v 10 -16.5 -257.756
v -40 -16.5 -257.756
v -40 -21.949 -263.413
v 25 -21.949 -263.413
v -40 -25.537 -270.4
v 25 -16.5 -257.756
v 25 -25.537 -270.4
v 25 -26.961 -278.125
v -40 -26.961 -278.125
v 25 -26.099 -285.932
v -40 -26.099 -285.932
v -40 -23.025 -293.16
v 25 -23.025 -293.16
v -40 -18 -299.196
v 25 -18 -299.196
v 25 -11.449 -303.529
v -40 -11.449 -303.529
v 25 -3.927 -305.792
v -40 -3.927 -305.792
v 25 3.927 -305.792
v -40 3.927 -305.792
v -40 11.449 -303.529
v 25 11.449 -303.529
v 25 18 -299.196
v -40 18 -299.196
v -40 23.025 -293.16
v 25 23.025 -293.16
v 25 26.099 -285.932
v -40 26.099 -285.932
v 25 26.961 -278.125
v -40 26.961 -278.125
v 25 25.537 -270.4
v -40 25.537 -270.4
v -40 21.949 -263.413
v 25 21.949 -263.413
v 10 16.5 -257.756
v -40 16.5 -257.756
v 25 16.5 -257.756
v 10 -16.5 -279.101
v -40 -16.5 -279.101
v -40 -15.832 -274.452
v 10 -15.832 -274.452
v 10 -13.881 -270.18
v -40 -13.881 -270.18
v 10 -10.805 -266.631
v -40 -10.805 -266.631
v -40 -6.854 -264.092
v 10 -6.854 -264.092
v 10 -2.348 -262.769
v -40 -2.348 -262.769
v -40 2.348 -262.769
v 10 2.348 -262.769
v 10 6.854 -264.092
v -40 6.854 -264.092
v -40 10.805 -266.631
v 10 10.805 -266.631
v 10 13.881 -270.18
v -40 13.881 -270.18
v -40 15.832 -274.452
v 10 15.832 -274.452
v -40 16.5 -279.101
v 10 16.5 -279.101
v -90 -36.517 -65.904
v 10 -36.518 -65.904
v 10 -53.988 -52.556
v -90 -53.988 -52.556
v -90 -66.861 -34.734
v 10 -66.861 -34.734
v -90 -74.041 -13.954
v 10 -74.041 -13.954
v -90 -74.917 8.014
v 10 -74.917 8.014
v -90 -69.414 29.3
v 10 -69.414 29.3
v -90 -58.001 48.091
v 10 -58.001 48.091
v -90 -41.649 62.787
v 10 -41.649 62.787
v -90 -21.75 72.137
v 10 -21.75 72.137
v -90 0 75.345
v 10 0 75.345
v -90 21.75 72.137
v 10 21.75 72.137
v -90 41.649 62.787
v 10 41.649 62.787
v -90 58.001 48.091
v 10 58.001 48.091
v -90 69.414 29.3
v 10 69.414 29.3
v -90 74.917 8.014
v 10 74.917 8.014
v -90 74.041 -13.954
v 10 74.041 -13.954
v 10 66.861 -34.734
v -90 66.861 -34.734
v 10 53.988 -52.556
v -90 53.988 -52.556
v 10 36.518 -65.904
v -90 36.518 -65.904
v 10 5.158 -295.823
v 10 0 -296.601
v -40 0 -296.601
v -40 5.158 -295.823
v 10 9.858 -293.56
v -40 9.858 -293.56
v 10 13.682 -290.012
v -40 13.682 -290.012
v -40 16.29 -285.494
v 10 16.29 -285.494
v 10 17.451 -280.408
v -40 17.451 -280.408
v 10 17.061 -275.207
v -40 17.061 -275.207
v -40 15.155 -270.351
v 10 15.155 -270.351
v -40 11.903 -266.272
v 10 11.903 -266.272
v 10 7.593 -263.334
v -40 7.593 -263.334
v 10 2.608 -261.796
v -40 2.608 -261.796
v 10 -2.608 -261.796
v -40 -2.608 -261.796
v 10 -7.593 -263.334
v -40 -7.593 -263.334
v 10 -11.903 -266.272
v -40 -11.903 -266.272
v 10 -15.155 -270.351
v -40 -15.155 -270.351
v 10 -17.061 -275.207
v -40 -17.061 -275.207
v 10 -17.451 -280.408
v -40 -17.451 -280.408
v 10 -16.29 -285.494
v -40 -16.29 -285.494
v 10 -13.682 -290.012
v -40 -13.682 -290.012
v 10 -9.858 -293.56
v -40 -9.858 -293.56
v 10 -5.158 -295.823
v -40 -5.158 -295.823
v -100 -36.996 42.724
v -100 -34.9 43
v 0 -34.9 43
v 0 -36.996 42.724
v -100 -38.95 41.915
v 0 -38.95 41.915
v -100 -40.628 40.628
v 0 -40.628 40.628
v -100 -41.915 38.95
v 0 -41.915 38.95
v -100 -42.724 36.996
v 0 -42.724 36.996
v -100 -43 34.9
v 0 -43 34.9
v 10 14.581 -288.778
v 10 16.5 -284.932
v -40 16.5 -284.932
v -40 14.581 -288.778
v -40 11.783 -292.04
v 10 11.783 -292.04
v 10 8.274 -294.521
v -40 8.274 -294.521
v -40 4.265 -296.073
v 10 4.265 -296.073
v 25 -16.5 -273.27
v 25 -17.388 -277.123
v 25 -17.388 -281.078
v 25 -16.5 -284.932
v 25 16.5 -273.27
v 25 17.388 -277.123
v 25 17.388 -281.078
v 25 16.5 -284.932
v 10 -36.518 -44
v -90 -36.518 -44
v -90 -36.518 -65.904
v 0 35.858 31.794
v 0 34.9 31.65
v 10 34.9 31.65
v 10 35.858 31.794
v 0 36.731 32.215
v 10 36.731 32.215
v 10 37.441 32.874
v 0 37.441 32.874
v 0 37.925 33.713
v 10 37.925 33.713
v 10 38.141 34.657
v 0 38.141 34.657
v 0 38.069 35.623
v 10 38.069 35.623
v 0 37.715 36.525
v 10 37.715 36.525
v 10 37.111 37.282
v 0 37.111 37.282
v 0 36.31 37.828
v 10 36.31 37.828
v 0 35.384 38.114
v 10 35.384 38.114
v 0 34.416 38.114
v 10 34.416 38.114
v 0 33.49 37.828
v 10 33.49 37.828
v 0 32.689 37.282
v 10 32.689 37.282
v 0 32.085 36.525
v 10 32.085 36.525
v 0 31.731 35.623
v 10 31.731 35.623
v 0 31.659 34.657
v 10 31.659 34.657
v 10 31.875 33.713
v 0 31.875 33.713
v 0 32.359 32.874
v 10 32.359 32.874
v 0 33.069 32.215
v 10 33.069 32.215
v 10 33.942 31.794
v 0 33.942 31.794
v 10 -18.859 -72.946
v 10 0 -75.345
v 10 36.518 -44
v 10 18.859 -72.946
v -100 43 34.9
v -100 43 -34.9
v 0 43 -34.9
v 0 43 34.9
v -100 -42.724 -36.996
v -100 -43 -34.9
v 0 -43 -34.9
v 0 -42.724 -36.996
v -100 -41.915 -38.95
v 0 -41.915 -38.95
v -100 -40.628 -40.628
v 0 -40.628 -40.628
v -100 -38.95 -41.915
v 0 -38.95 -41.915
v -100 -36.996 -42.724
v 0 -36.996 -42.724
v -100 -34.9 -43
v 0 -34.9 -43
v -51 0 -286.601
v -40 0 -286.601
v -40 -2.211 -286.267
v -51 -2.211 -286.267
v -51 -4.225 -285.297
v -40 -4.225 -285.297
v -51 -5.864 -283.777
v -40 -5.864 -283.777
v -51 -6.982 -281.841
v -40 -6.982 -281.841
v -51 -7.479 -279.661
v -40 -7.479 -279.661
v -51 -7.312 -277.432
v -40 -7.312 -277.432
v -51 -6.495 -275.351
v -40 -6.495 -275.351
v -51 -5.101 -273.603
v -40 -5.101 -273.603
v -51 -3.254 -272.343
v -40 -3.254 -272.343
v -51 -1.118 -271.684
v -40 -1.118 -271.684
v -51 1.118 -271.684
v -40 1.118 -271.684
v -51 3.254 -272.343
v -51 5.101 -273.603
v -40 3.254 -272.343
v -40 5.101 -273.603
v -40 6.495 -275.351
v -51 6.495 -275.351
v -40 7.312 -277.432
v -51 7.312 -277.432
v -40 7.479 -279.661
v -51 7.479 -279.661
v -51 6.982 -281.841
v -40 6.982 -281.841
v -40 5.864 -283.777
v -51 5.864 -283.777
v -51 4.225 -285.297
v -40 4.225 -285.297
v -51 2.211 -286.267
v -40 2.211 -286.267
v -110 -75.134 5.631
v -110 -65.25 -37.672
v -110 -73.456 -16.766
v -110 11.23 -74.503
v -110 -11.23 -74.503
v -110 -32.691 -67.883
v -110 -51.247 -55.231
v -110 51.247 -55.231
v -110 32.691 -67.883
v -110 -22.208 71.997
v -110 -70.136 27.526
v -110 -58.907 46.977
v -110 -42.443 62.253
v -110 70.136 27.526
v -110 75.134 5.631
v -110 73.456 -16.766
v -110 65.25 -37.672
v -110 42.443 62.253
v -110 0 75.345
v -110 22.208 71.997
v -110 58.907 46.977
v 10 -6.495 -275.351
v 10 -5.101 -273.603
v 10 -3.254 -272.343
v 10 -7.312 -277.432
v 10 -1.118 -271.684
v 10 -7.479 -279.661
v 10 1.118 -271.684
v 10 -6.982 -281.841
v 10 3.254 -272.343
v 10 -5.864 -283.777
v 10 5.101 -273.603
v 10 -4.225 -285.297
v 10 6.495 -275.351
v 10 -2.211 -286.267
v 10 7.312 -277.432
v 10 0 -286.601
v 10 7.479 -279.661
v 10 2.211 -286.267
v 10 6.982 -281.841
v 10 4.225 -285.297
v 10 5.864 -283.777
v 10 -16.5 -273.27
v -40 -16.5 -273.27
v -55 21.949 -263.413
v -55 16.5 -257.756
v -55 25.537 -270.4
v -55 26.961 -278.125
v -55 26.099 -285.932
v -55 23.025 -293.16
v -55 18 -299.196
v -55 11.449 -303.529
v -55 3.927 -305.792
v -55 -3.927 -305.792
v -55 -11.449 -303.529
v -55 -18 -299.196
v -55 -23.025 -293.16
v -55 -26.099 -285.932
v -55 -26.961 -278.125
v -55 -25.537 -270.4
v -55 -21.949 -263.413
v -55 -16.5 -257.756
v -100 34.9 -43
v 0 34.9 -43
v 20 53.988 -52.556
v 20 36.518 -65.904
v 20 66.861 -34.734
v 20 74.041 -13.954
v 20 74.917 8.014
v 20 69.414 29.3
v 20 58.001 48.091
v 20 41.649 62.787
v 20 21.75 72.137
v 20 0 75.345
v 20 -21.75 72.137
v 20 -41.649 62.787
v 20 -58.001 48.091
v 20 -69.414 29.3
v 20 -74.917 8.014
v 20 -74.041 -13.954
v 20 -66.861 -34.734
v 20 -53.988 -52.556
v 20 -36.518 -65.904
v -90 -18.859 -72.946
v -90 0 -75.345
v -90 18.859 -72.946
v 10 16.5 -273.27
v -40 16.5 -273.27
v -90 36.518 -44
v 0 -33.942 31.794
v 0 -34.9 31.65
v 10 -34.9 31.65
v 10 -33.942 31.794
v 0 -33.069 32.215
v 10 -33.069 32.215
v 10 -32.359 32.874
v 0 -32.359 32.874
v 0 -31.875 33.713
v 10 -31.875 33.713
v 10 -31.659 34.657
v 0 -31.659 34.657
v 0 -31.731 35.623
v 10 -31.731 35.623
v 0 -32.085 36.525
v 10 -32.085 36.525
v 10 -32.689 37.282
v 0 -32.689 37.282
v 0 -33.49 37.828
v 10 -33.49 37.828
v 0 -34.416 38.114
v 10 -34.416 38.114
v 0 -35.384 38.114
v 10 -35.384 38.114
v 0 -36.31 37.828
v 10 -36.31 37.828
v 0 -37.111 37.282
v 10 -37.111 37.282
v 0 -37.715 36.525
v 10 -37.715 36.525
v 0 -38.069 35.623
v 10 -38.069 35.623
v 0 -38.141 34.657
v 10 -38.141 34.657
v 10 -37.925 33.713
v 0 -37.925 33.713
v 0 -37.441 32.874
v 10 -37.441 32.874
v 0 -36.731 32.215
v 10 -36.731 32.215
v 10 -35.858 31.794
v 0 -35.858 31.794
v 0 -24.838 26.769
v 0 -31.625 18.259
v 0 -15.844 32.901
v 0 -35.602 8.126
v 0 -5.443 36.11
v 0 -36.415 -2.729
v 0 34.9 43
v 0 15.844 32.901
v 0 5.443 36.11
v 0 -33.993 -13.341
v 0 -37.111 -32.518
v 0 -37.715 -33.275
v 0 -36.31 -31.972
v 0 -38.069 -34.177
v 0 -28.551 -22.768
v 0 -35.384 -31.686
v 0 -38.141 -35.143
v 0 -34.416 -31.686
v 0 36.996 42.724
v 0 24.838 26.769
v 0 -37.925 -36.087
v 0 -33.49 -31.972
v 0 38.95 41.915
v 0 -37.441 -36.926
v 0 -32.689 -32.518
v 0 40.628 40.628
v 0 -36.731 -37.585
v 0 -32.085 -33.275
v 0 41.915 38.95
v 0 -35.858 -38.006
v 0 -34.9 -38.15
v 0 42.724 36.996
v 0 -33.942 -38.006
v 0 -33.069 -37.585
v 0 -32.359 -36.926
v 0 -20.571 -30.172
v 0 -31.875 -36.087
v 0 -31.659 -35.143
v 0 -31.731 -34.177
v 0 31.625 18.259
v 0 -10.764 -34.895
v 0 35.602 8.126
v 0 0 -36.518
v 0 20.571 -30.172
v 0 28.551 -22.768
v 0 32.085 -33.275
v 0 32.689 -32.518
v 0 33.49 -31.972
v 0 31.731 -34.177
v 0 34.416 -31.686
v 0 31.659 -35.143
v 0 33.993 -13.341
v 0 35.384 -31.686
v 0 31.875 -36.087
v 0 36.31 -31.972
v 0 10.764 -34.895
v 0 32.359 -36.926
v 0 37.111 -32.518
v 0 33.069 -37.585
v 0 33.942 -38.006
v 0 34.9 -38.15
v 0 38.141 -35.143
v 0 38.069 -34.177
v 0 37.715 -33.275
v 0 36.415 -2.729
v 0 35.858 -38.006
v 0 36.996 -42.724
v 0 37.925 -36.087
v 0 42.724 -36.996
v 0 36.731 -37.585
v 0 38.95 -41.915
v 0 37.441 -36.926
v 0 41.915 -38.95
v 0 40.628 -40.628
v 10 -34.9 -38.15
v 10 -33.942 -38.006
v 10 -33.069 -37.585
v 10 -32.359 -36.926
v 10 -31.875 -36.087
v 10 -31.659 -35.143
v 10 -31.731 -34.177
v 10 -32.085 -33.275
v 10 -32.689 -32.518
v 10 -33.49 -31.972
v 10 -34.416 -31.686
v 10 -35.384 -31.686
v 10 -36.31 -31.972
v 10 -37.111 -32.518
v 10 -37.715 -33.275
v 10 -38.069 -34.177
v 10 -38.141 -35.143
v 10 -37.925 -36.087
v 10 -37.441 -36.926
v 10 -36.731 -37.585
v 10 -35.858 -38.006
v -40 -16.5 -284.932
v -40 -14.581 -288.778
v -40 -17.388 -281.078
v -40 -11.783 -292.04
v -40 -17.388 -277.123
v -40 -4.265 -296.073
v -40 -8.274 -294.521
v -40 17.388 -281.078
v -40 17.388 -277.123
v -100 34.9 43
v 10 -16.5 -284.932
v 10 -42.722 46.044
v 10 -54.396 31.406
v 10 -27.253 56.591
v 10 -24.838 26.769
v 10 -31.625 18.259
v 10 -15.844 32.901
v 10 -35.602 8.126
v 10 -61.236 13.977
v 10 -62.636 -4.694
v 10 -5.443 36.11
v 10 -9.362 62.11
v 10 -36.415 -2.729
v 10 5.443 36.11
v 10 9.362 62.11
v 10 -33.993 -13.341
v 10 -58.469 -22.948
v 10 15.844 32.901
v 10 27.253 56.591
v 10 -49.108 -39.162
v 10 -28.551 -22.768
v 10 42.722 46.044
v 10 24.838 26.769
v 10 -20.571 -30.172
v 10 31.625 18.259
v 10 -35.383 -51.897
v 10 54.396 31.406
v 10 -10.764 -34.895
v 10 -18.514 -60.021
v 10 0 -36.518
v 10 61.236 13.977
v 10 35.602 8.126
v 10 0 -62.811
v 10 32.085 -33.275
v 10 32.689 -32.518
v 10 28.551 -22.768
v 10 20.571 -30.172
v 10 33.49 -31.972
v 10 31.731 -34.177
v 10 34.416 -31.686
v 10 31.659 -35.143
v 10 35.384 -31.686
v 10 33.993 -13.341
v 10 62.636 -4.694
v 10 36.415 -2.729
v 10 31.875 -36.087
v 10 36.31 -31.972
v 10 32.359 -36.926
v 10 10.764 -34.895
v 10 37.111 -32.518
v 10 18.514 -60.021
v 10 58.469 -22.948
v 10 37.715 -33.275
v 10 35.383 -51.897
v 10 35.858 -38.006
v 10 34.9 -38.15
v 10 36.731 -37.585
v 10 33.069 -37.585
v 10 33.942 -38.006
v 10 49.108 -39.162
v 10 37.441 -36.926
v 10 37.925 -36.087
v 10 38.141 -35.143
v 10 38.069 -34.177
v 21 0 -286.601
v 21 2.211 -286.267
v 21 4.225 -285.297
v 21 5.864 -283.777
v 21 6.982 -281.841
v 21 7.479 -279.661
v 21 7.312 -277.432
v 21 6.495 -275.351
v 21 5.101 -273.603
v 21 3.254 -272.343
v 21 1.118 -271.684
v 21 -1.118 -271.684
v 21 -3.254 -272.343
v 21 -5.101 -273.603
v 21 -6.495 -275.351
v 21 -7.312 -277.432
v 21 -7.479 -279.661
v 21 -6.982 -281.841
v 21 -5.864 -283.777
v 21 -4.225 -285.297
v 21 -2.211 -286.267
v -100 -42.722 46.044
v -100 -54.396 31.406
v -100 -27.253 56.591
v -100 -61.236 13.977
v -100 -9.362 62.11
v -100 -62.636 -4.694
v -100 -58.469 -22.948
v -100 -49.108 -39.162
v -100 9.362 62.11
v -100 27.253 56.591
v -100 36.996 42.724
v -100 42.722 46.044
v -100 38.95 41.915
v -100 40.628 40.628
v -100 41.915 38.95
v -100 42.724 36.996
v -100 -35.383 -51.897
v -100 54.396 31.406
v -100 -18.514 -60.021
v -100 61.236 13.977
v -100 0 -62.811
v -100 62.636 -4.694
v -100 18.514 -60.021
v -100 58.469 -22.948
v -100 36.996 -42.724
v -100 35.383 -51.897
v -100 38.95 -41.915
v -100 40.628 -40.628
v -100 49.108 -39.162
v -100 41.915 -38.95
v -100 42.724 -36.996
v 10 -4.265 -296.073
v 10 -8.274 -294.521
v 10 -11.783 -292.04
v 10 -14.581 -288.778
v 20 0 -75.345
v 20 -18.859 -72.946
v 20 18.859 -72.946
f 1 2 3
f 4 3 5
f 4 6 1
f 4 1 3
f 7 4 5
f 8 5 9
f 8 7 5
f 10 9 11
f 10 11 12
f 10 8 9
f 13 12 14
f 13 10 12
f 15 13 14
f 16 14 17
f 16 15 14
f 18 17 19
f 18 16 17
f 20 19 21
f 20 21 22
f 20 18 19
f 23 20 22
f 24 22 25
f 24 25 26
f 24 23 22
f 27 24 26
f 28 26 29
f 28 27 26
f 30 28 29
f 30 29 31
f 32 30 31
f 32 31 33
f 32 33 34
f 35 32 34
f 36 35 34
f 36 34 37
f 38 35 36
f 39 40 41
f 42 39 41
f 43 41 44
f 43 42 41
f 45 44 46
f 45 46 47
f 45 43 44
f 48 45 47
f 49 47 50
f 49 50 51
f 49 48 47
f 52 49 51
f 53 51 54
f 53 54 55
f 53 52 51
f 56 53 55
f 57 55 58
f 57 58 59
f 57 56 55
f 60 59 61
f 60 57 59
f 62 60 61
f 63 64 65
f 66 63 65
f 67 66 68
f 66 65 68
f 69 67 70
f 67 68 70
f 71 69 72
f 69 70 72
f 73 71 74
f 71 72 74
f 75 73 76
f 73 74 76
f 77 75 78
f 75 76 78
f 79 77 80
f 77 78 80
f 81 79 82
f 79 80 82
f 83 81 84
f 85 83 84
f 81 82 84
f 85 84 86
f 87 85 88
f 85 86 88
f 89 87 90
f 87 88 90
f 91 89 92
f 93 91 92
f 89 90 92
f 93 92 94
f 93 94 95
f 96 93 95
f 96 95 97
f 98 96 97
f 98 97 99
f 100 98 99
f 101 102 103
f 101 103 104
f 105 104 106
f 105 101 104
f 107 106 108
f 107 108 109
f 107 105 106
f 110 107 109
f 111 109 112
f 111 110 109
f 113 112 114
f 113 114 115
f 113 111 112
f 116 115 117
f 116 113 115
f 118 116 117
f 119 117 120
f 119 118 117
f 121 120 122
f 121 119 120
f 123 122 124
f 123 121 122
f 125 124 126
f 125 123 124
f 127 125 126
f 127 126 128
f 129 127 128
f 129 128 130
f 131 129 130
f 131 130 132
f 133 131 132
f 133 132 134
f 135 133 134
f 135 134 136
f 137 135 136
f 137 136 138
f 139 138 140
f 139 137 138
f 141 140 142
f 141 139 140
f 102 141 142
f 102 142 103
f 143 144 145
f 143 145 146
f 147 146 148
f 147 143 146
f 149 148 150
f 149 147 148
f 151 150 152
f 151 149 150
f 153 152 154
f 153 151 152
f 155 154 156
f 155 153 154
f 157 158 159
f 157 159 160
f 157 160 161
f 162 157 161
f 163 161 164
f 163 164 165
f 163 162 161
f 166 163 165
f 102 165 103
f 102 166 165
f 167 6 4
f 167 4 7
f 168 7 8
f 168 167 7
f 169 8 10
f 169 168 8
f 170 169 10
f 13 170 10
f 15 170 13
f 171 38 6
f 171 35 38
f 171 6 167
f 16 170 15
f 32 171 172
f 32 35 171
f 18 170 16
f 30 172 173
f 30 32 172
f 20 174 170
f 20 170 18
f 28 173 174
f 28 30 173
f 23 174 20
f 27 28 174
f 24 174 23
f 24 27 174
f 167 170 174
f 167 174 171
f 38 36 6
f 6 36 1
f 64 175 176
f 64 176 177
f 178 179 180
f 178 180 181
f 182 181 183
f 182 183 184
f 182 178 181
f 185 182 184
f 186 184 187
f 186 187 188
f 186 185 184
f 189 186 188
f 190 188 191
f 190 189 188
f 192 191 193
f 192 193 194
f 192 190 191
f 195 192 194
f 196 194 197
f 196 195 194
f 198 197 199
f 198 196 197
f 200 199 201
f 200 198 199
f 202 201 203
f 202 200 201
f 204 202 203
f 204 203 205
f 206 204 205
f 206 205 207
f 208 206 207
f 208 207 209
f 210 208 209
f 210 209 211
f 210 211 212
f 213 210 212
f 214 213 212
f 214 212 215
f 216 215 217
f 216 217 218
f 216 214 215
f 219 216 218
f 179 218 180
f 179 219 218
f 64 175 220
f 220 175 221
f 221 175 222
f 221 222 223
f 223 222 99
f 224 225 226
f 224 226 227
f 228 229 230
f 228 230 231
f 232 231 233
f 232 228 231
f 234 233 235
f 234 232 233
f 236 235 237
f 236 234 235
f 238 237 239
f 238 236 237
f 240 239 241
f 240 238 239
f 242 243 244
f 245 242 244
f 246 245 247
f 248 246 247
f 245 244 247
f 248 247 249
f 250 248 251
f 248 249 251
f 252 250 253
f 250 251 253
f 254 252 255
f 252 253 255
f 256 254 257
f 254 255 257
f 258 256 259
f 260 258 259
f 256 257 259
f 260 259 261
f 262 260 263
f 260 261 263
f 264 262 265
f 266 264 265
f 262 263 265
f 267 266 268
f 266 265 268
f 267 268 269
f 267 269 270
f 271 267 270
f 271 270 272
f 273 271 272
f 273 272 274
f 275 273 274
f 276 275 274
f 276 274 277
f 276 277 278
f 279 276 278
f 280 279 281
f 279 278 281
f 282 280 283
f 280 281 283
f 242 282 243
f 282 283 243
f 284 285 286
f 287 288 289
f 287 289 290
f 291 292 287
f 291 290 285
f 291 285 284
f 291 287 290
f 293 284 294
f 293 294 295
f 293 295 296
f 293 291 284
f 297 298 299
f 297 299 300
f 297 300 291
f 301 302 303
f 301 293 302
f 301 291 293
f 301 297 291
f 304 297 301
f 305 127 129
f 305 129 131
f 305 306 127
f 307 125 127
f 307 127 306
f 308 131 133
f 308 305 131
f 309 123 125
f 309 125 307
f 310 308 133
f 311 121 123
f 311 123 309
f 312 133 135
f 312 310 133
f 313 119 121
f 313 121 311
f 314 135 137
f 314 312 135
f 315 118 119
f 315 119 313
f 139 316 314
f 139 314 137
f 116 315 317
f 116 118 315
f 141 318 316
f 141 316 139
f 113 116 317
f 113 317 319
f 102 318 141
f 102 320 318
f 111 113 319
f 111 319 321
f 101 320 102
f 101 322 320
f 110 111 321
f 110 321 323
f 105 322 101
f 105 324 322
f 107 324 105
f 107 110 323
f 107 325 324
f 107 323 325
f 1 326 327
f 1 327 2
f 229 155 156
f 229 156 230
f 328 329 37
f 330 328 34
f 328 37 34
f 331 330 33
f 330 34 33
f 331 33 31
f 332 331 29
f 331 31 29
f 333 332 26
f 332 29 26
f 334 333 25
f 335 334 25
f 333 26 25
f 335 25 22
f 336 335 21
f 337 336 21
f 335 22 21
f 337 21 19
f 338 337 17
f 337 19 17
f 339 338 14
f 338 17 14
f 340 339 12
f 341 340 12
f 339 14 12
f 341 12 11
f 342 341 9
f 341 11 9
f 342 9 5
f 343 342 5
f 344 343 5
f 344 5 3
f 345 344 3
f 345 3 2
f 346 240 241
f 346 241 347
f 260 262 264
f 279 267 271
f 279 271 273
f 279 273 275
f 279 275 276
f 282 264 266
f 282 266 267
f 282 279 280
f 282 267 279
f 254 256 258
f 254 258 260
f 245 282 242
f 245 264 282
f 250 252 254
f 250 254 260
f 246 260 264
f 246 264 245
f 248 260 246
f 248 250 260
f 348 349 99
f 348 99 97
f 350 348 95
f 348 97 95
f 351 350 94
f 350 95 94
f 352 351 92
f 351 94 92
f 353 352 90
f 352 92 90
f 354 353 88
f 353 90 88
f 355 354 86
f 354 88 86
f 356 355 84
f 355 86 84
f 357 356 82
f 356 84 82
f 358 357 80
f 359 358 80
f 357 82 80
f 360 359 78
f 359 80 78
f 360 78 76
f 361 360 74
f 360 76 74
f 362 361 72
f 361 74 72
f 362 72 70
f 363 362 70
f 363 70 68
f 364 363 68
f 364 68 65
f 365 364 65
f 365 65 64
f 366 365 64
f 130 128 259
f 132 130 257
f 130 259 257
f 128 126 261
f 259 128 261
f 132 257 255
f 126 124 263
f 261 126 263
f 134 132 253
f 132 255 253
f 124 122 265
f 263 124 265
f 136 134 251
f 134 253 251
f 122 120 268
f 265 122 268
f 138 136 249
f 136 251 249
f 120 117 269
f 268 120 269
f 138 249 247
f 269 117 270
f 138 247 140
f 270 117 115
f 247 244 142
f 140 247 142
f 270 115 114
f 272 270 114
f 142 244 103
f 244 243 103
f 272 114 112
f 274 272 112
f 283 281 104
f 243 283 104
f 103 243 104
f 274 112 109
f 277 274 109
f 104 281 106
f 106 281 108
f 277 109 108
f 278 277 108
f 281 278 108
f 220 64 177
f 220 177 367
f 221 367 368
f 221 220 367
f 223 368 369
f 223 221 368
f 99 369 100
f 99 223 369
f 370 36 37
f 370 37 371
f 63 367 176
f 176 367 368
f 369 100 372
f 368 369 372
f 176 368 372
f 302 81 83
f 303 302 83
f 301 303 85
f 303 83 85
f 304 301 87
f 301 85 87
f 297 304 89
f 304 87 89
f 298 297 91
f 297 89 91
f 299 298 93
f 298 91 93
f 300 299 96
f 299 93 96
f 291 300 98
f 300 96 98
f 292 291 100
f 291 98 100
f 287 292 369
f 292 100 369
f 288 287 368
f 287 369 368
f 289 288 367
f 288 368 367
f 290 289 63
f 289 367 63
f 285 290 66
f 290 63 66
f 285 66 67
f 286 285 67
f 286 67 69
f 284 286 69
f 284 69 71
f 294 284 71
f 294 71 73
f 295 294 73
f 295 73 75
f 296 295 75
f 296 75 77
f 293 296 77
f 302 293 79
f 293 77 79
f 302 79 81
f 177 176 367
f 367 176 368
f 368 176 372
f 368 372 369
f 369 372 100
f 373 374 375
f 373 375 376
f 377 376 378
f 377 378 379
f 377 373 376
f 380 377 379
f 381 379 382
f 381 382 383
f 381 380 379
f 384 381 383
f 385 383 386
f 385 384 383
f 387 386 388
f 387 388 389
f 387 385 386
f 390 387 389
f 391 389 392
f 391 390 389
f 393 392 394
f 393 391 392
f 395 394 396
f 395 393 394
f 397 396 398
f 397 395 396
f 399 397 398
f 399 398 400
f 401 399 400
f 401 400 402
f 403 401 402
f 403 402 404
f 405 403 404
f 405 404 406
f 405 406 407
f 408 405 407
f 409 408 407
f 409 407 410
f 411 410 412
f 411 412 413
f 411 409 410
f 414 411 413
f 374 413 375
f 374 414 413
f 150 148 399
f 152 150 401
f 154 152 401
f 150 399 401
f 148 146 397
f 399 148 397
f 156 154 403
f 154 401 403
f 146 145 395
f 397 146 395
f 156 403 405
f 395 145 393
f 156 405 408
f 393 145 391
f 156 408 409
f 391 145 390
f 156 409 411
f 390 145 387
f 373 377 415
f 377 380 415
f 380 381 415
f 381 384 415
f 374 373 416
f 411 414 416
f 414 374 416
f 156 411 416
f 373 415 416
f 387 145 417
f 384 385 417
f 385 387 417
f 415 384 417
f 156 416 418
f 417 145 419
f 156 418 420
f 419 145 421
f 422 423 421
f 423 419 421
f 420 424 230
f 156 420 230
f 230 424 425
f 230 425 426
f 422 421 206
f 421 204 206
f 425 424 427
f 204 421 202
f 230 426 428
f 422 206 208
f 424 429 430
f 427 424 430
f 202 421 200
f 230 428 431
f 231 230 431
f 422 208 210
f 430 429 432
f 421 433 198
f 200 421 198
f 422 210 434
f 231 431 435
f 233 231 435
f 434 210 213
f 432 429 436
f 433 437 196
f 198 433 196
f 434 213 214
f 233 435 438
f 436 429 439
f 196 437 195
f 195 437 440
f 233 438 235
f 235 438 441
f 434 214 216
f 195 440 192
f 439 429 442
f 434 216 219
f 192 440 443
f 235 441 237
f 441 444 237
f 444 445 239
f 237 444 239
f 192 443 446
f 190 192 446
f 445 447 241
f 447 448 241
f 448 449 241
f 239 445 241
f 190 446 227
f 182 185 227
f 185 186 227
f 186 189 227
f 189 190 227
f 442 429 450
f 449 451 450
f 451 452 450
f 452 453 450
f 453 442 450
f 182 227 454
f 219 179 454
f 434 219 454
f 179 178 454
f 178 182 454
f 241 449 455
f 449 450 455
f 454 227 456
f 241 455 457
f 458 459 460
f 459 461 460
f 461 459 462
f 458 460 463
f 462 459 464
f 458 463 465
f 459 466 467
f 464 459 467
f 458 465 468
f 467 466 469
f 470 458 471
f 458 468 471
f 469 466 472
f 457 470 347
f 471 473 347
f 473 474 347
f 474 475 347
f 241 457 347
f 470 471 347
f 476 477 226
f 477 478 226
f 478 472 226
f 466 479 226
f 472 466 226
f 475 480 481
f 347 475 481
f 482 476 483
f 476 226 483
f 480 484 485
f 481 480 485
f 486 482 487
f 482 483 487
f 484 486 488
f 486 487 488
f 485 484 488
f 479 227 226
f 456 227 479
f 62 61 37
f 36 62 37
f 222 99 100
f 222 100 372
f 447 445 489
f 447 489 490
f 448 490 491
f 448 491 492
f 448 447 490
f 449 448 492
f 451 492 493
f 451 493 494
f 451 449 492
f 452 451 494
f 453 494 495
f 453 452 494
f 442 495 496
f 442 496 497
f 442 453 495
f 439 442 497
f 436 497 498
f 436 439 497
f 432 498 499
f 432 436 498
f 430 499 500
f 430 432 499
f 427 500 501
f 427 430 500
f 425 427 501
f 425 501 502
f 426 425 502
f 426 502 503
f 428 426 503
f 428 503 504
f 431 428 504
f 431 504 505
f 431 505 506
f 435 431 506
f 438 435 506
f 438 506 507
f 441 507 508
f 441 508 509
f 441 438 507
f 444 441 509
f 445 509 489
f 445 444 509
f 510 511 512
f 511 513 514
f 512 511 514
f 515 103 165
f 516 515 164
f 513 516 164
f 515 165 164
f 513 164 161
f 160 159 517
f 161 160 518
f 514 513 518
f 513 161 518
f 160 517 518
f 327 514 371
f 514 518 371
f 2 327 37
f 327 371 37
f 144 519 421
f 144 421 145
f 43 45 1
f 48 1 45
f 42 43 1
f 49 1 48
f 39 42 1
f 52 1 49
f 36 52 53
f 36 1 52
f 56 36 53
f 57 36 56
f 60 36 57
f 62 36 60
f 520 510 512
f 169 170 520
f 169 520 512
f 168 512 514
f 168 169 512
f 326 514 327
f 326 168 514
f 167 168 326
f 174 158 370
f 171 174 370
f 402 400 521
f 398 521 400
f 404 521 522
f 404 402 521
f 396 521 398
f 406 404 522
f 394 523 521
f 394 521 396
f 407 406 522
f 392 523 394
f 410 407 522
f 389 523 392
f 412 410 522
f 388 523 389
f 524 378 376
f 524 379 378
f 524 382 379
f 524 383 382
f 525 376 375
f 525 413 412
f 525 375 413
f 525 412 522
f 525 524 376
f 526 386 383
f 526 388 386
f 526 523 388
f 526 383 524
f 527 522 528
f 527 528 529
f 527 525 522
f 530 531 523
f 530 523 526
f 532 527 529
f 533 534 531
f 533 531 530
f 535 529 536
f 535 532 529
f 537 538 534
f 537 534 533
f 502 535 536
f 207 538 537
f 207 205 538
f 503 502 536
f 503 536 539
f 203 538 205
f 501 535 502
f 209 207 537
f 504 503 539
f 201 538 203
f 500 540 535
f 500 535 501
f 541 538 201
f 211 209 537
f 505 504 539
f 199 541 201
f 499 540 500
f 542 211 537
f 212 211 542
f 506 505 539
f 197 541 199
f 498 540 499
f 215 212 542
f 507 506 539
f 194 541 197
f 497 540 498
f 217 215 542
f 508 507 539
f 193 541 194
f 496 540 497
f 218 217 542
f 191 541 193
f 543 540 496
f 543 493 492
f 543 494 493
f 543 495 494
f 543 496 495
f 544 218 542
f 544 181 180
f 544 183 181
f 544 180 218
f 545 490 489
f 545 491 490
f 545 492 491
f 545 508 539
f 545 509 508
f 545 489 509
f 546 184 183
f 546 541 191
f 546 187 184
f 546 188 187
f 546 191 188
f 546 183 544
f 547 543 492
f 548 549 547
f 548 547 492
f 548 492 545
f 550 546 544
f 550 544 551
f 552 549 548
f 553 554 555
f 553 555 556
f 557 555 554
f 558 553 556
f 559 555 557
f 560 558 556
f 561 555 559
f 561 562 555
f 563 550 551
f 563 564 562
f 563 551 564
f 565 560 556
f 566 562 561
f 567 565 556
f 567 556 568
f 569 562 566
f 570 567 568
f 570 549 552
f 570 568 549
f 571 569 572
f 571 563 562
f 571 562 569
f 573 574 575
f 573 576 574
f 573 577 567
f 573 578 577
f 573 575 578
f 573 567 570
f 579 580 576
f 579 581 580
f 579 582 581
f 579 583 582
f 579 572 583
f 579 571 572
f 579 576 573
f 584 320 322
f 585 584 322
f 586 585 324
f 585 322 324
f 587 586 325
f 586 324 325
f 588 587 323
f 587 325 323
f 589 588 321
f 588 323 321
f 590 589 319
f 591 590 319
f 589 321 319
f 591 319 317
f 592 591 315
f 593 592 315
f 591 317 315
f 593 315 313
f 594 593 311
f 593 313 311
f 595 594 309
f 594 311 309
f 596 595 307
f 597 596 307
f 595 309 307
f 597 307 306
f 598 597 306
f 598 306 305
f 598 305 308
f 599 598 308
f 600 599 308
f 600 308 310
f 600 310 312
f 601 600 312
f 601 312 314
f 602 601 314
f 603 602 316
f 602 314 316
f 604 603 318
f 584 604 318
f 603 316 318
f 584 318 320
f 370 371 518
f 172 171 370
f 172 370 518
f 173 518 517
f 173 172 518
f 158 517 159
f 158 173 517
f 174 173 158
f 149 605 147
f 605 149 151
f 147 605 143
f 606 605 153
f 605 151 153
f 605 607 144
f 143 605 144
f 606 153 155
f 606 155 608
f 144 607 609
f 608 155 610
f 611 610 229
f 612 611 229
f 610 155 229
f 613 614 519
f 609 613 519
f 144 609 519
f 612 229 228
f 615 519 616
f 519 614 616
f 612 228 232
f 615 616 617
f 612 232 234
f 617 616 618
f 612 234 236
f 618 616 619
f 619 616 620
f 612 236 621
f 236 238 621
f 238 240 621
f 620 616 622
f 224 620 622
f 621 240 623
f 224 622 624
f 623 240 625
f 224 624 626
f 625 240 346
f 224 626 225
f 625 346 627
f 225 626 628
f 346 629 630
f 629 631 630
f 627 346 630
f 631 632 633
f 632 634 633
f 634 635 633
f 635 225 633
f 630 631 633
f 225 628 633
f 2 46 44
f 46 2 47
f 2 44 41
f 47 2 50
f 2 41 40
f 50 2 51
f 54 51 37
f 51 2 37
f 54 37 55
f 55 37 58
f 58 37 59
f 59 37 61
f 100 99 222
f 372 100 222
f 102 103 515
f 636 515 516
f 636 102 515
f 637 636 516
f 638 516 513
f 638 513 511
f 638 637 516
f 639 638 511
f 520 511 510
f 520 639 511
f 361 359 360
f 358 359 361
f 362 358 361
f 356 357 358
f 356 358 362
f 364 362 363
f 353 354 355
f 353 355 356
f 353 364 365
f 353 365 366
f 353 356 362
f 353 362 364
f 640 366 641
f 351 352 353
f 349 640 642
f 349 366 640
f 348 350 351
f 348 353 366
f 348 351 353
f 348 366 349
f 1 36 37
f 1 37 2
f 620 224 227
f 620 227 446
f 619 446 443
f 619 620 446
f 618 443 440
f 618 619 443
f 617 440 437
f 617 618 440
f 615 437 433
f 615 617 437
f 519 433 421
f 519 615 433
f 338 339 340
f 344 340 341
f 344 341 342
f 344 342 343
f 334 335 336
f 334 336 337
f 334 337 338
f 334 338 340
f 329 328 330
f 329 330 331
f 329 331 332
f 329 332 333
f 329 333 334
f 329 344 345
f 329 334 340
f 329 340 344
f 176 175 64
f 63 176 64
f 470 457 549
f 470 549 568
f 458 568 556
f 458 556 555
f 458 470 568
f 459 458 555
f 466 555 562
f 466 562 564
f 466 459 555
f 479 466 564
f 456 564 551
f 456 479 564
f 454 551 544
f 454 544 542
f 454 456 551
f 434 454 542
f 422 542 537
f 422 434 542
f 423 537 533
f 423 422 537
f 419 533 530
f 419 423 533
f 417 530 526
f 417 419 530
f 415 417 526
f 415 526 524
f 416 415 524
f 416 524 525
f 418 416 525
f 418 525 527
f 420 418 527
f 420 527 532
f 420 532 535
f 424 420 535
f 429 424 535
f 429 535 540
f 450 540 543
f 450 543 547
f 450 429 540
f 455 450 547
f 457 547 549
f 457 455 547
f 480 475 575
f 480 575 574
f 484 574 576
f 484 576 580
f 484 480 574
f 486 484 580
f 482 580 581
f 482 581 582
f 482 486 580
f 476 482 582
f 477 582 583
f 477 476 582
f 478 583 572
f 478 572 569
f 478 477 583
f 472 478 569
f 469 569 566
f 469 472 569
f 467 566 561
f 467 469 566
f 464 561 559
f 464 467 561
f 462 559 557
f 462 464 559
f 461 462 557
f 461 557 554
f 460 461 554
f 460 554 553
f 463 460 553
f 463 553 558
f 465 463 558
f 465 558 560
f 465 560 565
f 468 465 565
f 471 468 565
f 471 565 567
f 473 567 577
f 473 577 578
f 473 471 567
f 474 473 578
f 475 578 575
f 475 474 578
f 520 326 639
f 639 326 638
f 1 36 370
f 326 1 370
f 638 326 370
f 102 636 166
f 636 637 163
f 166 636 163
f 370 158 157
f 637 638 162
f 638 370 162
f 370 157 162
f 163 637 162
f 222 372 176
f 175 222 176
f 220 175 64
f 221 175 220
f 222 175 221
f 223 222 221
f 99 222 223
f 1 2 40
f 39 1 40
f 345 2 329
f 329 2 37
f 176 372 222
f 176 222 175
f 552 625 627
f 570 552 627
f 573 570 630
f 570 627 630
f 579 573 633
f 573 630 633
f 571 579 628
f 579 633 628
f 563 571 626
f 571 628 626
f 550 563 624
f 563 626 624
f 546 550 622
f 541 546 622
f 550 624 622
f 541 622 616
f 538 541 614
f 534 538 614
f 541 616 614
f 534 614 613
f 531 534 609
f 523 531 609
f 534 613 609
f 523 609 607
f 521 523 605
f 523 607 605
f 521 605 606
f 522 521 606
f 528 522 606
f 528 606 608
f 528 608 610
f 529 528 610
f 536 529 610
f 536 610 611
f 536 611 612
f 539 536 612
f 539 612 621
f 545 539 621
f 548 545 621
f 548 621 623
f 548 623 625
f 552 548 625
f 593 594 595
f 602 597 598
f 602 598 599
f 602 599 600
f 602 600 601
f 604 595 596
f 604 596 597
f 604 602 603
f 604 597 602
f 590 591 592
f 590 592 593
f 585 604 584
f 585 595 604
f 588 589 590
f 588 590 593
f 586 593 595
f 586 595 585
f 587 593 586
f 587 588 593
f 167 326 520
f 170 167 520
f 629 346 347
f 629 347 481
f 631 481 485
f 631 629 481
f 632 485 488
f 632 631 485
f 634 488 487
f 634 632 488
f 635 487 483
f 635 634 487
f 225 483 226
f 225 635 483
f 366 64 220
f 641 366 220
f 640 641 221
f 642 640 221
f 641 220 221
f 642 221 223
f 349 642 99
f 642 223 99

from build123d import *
from build123d.topology import SkipClean

# Parameters (mm, degrees)
SKETCH1_R            = 62.811183182
SKETCH1_R_2          = 3.25
SKETCH1_R_3          = 36.5175
BOSS_EXTRUDE1_DEPTH  = 10
BOSS_EXTRUDE2_START  = -100
SKETCH1_3_R          = 62.811183182
BOSS_EXTRUDE2_DEPTH  = 100
BOSS_EXTRUDE3_DEPTH  = 100
SKETCH2_4_R          = 3.25
SKETCH2_4_R_2        = 36.5175
BOSS_EXTRUDE4_DEPTH  = 10
BOSS_EXTRUDE5_DEPTH  = 100
SKETCH4_R            = 75.344599786
BOSS_EXTRUDE6_DEPTH  = 20
SKETCH5_R            = 7.5
BOSS_EXTRUDE7_DEPTH  = 11
SKETCH5_3_R          = 17.5
SKETCH5_3_R_2        = 7.5
BOSS_EXTRUDE8_DEPTH  = 50
SKETCH6_R            = 7.5
BOSS_EXTRUDE9_DEPTH  = 11
BOSS_EXTRUDE10_DEPTH = 50
BOSS_EXTRUDE11_DEPTH = 15
BOSS_EXTRUDE12_DEPTH = 50
BOSS_EXTRUDE13_DEPTH = 15


# Read off the part's stored shape, not the designer's step: Boss-Extrude11
with BuildPart() as part:
    # Sketch1 → Boss-Extrude1 (new body)
    # profile 1 of 2: a face of its own
    with BuildSketch(Plane(origin=(0, 0, 0), x_dir=(0, 0, -1), z_dir=(1, 0, 0))):
        Circle(SKETCH1_R)
        with BuildLine():
            ThreePointArc((43, 34.9), (40.627564928, 40.627564928), (34.9, 43))
            Line((34.9, 43), (-34.9, 43))
            ThreePointArc((-34.9, 43), (-40.627564928, 40.627564928), (-43, 34.9))
            Line((-43, 34.9), (-43, -34.9))
            ThreePointArc((-43, -34.9), (-40.627564928, -40.627564928), (-34.9, -43))
            Line((-34.9, -43), (34.9, -43))
            ThreePointArc((34.9, -43), (40.627564928, -40.627564928), (43, -34.9))
            Line((43, -34.9), (43, 34.9))
        make_face(mode=Mode.SUBTRACT)
    # profile 2 of 2: a face of its own
    with BuildSketch(Plane(origin=(0, 0, 0), x_dir=(0, 0, -1), z_dir=(1, 0, 0))):
        with BuildLine():
            Line((43, -34.9), (43, 34.9))
            ThreePointArc((43, 34.9), (40.627564928, 40.627564928), (34.9, 43))
            Line((34.9, 43), (-34.9, 43))
            ThreePointArc((-34.9, 43), (-40.627564928, 40.627564928), (-43, 34.9))
            Line((-43, 34.9), (-43, -34.9))
            ThreePointArc((-43, -34.9), (-40.627564928, -40.627564928), (-34.9, -43))
            Line((-34.9, -43), (34.9, -43))
            ThreePointArc((34.9, -43), (40.627564928, -40.627564928), (43, -34.9))
        make_face()
        with Locations((-34.9, -34.9)):
            Circle(SKETCH1_R_2, mode=Mode.SUBTRACT)
        with Locations((34.9, -34.9)):
            Circle(SKETCH1_R_2, mode=Mode.SUBTRACT)
        with Locations((34.9, 34.9)):
            Circle(SKETCH1_R_2, mode=Mode.SUBTRACT)
        with Locations((-34.9, 34.9)):
            Circle(SKETCH1_R_2, mode=Mode.SUBTRACT)
        Circle(SKETCH1_R_3, mode=Mode.SUBTRACT)
    extrude(amount=BOSS_EXTRUDE1_DEPTH)

    # Sketch1<3> → Boss-Extrude2 (add)
    with BuildSketch(Plane(origin=(0, 0, 0), x_dir=(0, 0, -1), z_dir=(1, 0, 0)).offset(BOSS_EXTRUDE2_START)):
        Circle(SKETCH1_3_R)
        with BuildLine():
            ThreePointArc((43, 34.9), (40.627564928, 40.627564928), (34.9, 43))
            Line((34.9, 43), (-34.9, 43))
            ThreePointArc((-34.9, 43), (-40.627564928, 40.627564928), (-43, 34.9))
            Line((-43, 34.9), (-43, -34.9))
            ThreePointArc((-43, -34.9), (-40.627564928, -40.627564928), (-34.9, -43))
            Line((-34.9, -43), (34.9, -43))
            ThreePointArc((34.9, -43), (40.627564928, -40.627564928), (43, -34.9))
            Line((43, -34.9), (43, 34.9))
        make_face(mode=Mode.SUBTRACT)
    extrude(amount=BOSS_EXTRUDE2_DEPTH)


with BuildPart() as body_2:
    # Sketch2 → Boss-Extrude3 (new body)
    with BuildSketch(Plane(origin=(10, 0, 0), x_dir=(0, 0, -1), z_dir=(1, 0, 0))):
        with BuildLine():
            Line((44, 36.5175), (44, -36.5175))
            Line((44, -36.5175), (65.903572821, -36.5175))
            ThreePointArc((65.903572821, -36.5175), (75.344599786, 0), (65.903572821, 36.5175))
            Line((65.903572821, 36.5175), (44, 36.5175))
        make_face()
    extrude(amount=-BOSS_EXTRUDE3_DEPTH)


with BuildPart() as body_3:
    # Sketch2<4> → Boss-Extrude4 (new body)
    # profile 1 of 9: a face of its own
    with BuildSketch(Plane(origin=(10, 0, 0), x_dir=(0, 0, -1), z_dir=(1, 0, 0))):
        with BuildLine():
            Line((44, -36.5175), (44, 36.5175))
            Line((44, 36.5175), (51.104959901, 36.5175))
            ThreePointArc((51.104959901, 36.5175), (-62.811183182, 0), (51.104959901, -36.5175))
            Line((51.104959901, -36.5175), (44, -36.5175))
        make_face()
        with Locations((-34.9, -34.9)):
            Circle(SKETCH2_4_R, mode=Mode.SUBTRACT)
        with Locations((34.9, -34.9)):
            Circle(SKETCH2_4_R, mode=Mode.SUBTRACT)
        Circle(SKETCH2_4_R_2, mode=Mode.SUBTRACT)
        with Locations((-34.9, 34.9)):
            Circle(SKETCH2_4_R, mode=Mode.SUBTRACT)
        with Locations((34.9, 34.9)):
            Circle(SKETCH2_4_R, mode=Mode.SUBTRACT)
    # profile 2 of 9: a face of its own
    with BuildSketch(Plane(origin=(10, 0, 0), x_dir=(0, 0, -1), z_dir=(1, 0, 0))):
        with Locations((34.9, 34.9)):
            Circle(SKETCH2_4_R)
    # profile 3 of 9: a face of its own
    with BuildSketch(Plane(origin=(10, 0, 0), x_dir=(0, 0, -1), z_dir=(1, 0, 0))):
        with Locations((34.9, -34.9)):
            Circle(SKETCH2_4_R)
    # profile 4 of 9: a face of its own
    with BuildSketch(Plane(origin=(10, 0, 0), x_dir=(0, 0, -1), z_dir=(1, 0, 0))):
        with Locations((-34.9, -34.9)):
            Circle(SKETCH2_4_R)
    # profile 5 of 9: a face of its own
    with BuildSketch(Plane(origin=(10, 0, 0), x_dir=(0, 0, -1), z_dir=(1, 0, 0))):
        with Locations((-34.9, 34.9)):
            Circle(SKETCH2_4_R)
    # profile 6 of 9: a face of its own
    with BuildSketch(Plane(origin=(10, 0, 0), x_dir=(0, 0, -1), z_dir=(1, 0, 0))):
        Circle(SKETCH2_4_R_2)
    # profile 7 of 9: a face of its own
    with BuildSketch(Plane(origin=(10, 0, 0), x_dir=(0, 0, -1), z_dir=(1, 0, 0))):
        with BuildLine():
            Line((51.104959901, 36.5175), (44, 36.5175))
            Line((44, 36.5175), (44, -36.5175))
            Line((44, -36.5175), (51.104959901, -36.5175))
            ThreePointArc((51.104959901, -36.5175), (59.813074367, -19.173963269), (62.811183182, 0))
            ThreePointArc((62.811183182, 0), (59.813074367, 19.173963269), (51.104959901, 36.5175))
        make_face()
    # profile 8 of 9: a face of its own
    with BuildSketch(Plane(origin=(10, 0, 0), x_dir=(0, 0, -1), z_dir=(1, 0, 0))):
        with BuildLine():
            Line((65.903572821, 36.5175), (51.104959901, 36.5175))
            ThreePointArc((51.104959901, 36.5175), (59.813074367, 19.173963269), (62.811183182, 0))
            ThreePointArc((62.811183182, 0), (59.813074367, -19.173963269), (51.104959901, -36.5175))
            Line((51.104959901, -36.5175), (65.903572821, -36.5175))
            ThreePointArc((65.903572821, -36.5175), (75.344599786, 0), (65.903572821, 36.5175))
        make_face()
    # profile 9 of 9: a face of its own
    with BuildSketch(Plane(origin=(10, 0, 0), x_dir=(0, 0, -1), z_dir=(1, 0, 0))):
        with BuildLine():
            ThreePointArc((51.104959901, -36.5175), (-62.811183182, 0), (51.104959901, 36.5175))
            Line((51.104959901, 36.5175), (65.903572821, 36.5175))
            ThreePointArc((65.903572821, 36.5175), (-75.344599786, 0), (65.903572821, -36.5175))
            Line((65.903572821, -36.5175), (51.104959901, -36.5175))
        make_face()
    extrude(amount=BOSS_EXTRUDE4_DEPTH)

    # Sketch3 → Boss-Extrude5 (add)
    with BuildSketch(Plane.ZY.offset(-10)):
        with BuildLine():
            ThreePointArc((-65.903572821, -36.5175), (75.344599786, 0), (-65.903572821, 36.5175))
            Line((-65.903572821, 36.5175), (-44, 36.5175))
            Line((-44, 36.5175), (-44, -36.5175))
            Line((-44, -36.5175), (-65.903572821, -36.5175))
        make_face()
    extrude(amount=BOSS_EXTRUDE5_DEPTH)

    # Sketch4 → Boss-Extrude6 (add)
    with SkipClean():  # the faces are left unmerged after this step: merging them gives an invalid solid
        with BuildSketch(Plane.ZY.offset(90)):
            Circle(SKETCH4_R)
        extrude(amount=BOSS_EXTRUDE6_DEPTH)


with BuildPart() as body_4:
    # Sketch5 → Boss-Extrude7 (new body)
    with BuildSketch(Plane(origin=(10, 0, 0), x_dir=(0, 0, -1), z_dir=(1, 0, 0))):
        with Locations((279.100696087, 0)):
            Circle(SKETCH5_R)
    extrude(amount=BOSS_EXTRUDE7_DEPTH)

    # Sketch5<3> → Boss-Extrude8 (add)
    # profile 1 of 2: a face of its own
    with BuildSketch(Plane(origin=(10, 0, 0), x_dir=(0, 0, -1), z_dir=(1, 0, 0))):
        with Locations((279.100696087, 0)):
            Circle(SKETCH5_3_R)
        with Locations((279.100696087, 0)):
            Circle(SKETCH5_3_R_2, mode=Mode.SUBTRACT)
    # profile 2 of 2: a face of its own
    with BuildSketch(Plane(origin=(10, 0, 0), x_dir=(0, 0, -1), z_dir=(1, 0, 0))):
        with Locations((279.100696087, 0)):
            Circle(SKETCH5_3_R_2)
    extrude(amount=-BOSS_EXTRUDE8_DEPTH)

    # Sketch6 → Boss-Extrude9 (add)
    with BuildSketch(Plane.ZY.offset(40)):
        with Locations(Location((-279.100696087, 0, 0), (0, 0, 180))):
            Circle(SKETCH6_R)
    extrude(amount=BOSS_EXTRUDE9_DEPTH)


with BuildPart() as body_5:
    # Sketch7 → Boss-Extrude10 (new body)
    with BuildSketch(Plane(origin=(10, 0, 0), x_dir=(0, 0, -1), z_dir=(1, 0, 0))):
        with BuildLine():
            ThreePointArc((279.100696087, -16.5), (262.600696087, 0), (279.100696087, 16.5))
            Line((279.100696087, 16.5), (257.756246675, 16.5))
            Line((257.756246675, 16.5), (257.756246675, -16.5))
            Line((257.756246675, -16.5), (279.100696087, -16.5))
        make_face()
    extrude(amount=-BOSS_EXTRUDE10_DEPTH)


with BuildPart() as body_6:
    # Boss-Extrude11 outline → Boss-Extrude11 (new body)
    with BuildSketch(Plane(origin=(10, 0, 0), x_dir=(0, 0, -1), z_dir=(1, 0, 0))):
        with BuildLine():
            Line((257.756246675, 16.5), (257.756246675, -16.5))
            ThreePointArc((257.756246675, -16.5), (306.079123037, 0), (257.756246675, 16.5))
        make_face()
        with BuildLine():
            Line((273.269744192, -16.5), (284.931647982, -16.5))
            ThreePointArc((284.931647982, -16.5), (279.100696087, -17.5), (273.269744192, -16.5))
        make_face(mode=Mode.SUBTRACT)
        with BuildLine():
            ThreePointArc((273.269744192, 16.5), (279.100696087, 17.5), (284.931647982, 16.5))
            Line((284.931647982, 16.5), (273.269744192, 16.5))
        make_face(mode=Mode.SUBTRACT)
    extrude(amount=BOSS_EXTRUDE11_DEPTH)

    # Sketch7<4> → Boss-Extrude12 (add)
    with BuildSketch(Plane(origin=(10, 0, 0), x_dir=(0, 0, -1), z_dir=(1, 0, 0))):
        with BuildLine():
            ThreePointArc((273.269744192, 16.5), (279.100696087, 17.5), (284.931647982, 16.5))
            ThreePointArc((284.931647982, 16.5), (293.388657071, 10.104660851), (296.600696087, 0))
            ThreePointArc((296.600696087, 0), (293.388657071, -10.104660851), (284.931647982, -16.5))
            ThreePointArc((284.931647982, -16.5), (279.100696087, -17.5), (273.269744192, -16.5))
            Line((273.269744192, -16.5), (257.756246675, -16.5))
            ThreePointArc((257.756246675, -16.5), (306.079123037, 0), (257.756246675, 16.5))
            Line((257.756246675, 16.5), (273.269744192, 16.5))
        make_face()
    extrude(amount=-BOSS_EXTRUDE12_DEPTH)

    # Sketch8 → Boss-Extrude13 (add)
    with BuildSketch(Plane.ZY.offset(40)):
        with BuildLine():
            Line((-257.756246675, -16.5), (-257.756246675, 16.5))
            ThreePointArc((-257.756246675, 16.5), (-306.079123037, 0), (-257.756246675, -16.5))
        make_face()
    extrude(amount=BOSS_EXTRUDE13_DEPTH)


solid = Compound([part.part, body_2.part, body_3.part, body_4.part, body_5.part, body_6.part])
